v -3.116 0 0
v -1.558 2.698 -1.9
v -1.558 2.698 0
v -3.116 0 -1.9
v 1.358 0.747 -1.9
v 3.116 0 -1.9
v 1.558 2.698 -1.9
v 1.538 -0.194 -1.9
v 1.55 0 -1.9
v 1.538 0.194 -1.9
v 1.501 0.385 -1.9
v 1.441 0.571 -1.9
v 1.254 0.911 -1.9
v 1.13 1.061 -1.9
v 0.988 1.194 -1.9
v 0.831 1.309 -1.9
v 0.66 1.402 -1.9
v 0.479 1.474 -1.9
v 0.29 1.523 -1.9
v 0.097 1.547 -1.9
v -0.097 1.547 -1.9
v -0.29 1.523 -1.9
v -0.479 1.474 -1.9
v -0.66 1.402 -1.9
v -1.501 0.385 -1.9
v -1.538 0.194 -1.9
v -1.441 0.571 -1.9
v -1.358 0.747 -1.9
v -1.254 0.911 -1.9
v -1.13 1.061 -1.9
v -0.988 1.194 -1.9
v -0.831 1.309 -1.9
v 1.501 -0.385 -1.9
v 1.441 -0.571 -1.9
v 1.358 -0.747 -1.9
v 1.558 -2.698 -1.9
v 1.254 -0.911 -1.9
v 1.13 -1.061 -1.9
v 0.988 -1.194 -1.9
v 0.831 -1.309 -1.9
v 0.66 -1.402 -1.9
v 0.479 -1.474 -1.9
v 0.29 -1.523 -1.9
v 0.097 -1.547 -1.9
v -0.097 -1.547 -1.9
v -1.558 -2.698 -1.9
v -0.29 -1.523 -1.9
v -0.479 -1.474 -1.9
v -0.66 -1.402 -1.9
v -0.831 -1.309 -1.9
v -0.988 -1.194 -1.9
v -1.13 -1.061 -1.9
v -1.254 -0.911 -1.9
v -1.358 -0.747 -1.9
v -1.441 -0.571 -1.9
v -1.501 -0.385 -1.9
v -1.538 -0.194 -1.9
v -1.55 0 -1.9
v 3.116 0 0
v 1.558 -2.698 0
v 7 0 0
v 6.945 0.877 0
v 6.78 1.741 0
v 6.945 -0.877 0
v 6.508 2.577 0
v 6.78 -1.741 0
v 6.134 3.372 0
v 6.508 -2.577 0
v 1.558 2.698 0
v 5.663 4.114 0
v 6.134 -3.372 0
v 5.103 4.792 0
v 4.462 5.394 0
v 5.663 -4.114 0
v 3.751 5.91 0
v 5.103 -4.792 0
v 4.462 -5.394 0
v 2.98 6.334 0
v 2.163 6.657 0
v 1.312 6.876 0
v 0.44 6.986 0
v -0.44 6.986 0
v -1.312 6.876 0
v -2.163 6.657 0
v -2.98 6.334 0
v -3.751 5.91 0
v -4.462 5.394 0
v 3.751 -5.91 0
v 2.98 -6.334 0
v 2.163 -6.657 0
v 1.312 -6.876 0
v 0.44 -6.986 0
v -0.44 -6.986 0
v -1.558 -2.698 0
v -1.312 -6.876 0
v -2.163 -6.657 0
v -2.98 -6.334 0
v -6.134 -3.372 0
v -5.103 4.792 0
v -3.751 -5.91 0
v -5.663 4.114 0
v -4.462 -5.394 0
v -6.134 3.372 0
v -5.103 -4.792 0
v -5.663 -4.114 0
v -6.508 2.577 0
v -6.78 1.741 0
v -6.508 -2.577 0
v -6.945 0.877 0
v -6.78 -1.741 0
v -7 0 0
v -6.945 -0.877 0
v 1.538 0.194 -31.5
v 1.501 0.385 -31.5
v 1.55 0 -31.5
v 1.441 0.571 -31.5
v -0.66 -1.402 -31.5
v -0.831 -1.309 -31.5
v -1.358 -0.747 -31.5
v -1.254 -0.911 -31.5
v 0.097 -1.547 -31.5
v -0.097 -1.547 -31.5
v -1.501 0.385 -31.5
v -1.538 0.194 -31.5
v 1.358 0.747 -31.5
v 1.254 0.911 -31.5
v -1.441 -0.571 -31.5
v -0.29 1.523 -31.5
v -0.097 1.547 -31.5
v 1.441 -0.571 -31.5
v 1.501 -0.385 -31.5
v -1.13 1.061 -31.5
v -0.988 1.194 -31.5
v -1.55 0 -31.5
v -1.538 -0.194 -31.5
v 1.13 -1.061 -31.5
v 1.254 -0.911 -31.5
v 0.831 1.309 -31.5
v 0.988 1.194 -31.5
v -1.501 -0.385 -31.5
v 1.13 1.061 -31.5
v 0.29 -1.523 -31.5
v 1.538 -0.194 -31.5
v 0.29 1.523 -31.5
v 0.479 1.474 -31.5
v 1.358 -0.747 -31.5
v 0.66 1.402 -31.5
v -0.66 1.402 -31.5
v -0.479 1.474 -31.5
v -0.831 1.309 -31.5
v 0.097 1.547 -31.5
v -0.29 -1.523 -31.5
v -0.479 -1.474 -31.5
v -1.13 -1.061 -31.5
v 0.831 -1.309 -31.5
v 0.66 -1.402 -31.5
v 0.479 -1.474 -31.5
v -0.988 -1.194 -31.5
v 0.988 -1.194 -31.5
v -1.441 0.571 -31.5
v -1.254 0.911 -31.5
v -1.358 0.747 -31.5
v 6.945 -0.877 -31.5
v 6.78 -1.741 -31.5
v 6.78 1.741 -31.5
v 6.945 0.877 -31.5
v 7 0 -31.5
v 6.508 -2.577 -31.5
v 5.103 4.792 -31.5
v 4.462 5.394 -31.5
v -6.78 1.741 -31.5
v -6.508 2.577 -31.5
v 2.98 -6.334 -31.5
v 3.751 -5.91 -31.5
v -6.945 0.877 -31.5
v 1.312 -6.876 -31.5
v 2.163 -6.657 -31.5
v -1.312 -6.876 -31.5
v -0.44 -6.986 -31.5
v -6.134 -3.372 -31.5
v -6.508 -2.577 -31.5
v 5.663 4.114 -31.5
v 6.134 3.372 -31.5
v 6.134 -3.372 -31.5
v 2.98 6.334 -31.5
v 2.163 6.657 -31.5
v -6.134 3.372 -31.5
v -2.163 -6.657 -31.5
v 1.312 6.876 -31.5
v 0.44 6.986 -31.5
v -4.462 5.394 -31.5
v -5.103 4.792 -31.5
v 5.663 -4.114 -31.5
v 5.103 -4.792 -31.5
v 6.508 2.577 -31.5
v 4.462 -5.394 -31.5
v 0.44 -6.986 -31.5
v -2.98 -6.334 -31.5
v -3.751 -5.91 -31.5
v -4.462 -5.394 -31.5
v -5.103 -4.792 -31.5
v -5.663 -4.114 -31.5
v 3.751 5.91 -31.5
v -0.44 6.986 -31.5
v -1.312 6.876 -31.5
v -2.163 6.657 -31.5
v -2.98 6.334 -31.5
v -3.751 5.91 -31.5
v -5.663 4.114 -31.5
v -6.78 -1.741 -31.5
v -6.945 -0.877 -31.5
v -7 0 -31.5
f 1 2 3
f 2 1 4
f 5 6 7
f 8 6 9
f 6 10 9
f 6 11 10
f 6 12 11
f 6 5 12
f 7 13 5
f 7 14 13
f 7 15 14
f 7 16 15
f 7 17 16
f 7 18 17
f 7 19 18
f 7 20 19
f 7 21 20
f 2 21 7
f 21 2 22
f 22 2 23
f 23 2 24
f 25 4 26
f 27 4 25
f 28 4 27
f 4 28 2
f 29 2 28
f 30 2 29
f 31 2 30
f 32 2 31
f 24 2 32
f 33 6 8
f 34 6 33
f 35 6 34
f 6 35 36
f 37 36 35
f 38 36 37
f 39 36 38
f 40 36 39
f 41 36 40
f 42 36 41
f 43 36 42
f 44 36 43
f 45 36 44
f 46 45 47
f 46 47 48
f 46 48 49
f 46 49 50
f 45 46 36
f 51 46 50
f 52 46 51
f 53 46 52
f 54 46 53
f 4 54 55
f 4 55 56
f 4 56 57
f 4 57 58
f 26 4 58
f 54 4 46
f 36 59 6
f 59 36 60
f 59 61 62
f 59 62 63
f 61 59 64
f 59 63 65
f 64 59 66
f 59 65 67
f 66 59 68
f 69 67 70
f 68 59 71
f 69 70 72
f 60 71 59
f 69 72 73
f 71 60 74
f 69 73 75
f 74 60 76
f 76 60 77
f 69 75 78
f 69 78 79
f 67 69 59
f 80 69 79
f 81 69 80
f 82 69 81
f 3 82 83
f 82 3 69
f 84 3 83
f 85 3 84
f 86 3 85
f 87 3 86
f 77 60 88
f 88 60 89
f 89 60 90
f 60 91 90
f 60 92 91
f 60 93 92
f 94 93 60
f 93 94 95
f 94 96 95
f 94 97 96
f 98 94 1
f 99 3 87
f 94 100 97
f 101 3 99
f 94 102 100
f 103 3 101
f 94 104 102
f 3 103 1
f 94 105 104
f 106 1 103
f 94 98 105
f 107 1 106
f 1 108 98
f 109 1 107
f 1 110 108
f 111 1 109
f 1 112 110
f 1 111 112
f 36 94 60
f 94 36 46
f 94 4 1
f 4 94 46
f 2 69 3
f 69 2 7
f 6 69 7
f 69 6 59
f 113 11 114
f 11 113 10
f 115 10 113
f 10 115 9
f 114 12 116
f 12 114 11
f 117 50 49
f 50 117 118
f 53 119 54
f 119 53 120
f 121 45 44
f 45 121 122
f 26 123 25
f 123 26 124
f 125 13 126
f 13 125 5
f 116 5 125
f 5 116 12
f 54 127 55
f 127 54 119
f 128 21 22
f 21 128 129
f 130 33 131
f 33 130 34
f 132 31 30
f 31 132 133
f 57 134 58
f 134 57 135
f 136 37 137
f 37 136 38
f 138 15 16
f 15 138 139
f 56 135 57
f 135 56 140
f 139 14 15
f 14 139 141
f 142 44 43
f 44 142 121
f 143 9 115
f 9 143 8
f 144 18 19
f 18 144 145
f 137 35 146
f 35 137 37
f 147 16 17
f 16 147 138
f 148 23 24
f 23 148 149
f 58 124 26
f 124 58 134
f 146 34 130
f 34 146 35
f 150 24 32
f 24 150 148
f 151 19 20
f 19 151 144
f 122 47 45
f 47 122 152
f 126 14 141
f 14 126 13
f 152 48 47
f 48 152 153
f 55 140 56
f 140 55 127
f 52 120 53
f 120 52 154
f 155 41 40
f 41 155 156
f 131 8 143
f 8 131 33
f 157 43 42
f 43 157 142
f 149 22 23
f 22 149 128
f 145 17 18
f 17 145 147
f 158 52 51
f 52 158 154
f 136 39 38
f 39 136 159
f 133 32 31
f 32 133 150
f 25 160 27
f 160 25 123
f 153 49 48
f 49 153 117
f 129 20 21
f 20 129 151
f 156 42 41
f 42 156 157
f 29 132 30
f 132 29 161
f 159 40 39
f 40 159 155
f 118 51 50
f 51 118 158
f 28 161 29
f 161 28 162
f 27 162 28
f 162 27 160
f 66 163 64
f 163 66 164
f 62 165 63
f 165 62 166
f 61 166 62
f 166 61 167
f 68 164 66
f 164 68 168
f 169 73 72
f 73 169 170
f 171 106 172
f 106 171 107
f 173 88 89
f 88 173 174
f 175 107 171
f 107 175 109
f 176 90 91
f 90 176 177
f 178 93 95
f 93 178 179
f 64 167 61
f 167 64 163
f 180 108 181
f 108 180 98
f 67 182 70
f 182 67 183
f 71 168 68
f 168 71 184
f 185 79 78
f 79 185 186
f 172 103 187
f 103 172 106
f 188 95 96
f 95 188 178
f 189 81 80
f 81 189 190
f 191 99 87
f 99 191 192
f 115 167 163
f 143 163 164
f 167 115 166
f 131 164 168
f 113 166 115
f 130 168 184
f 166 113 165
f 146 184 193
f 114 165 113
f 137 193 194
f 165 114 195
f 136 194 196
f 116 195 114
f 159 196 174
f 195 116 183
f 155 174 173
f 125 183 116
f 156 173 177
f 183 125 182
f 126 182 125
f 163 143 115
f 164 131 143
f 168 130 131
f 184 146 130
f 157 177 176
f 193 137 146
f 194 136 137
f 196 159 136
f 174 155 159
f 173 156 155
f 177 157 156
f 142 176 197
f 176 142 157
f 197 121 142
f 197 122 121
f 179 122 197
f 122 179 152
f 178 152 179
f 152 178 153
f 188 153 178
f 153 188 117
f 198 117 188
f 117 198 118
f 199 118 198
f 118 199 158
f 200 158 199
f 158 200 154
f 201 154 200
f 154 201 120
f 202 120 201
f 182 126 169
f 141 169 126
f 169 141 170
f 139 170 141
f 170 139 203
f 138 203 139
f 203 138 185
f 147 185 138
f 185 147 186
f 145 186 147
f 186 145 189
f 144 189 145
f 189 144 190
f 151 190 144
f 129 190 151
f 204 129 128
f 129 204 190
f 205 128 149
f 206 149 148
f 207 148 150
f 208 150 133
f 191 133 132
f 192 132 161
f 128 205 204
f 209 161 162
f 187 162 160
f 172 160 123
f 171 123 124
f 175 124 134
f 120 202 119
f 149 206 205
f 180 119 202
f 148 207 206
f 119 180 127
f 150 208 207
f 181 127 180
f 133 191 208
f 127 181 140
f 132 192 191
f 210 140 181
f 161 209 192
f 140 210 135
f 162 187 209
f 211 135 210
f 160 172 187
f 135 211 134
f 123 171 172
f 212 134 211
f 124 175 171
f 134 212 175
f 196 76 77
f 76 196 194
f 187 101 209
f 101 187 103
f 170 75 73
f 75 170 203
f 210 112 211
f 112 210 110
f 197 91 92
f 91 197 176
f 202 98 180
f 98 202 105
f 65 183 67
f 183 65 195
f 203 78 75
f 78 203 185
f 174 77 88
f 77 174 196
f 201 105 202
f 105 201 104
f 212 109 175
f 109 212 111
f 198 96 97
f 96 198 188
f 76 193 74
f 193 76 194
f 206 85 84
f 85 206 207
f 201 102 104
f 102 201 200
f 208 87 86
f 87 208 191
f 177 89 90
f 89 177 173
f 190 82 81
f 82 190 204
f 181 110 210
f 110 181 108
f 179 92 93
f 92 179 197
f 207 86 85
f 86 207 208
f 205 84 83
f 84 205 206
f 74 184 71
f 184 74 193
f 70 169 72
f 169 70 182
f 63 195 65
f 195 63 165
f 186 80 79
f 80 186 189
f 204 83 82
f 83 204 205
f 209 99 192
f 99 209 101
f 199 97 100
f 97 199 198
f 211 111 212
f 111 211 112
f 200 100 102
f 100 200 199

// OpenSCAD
$fn = 50;

difference() {
	union() {
		translate(v = [0, 0, -31.5]) {
			cylinder(h = 31.5, r = 7.0);
		}
	}
	union() {
		translate(v = [0, 0, 0]) {
			rotate(a = [0, 0, 0]) {
				difference() {
					union() {
						translate(v = [0, 0, -1.9]) {
							linear_extrude(height = 1.9) {
								polygon(points = [[3.1158, 0.0], [1.5579000000000005, 2.698361953111554], [-1.5578999999999994, 2.6983619531115544], [-3.1158, 3.815754496783323e-16], [-1.5579000000000014, -2.6983619531115535], [1.557899999999998, -2.6983619531115552]]);
							}
						}
					}
					union();
				}
			}
		}
		#translate(v = [0, 0, -100.0]) {
			cylinder(h = 200, r = 1.55);
		}
	}
}
